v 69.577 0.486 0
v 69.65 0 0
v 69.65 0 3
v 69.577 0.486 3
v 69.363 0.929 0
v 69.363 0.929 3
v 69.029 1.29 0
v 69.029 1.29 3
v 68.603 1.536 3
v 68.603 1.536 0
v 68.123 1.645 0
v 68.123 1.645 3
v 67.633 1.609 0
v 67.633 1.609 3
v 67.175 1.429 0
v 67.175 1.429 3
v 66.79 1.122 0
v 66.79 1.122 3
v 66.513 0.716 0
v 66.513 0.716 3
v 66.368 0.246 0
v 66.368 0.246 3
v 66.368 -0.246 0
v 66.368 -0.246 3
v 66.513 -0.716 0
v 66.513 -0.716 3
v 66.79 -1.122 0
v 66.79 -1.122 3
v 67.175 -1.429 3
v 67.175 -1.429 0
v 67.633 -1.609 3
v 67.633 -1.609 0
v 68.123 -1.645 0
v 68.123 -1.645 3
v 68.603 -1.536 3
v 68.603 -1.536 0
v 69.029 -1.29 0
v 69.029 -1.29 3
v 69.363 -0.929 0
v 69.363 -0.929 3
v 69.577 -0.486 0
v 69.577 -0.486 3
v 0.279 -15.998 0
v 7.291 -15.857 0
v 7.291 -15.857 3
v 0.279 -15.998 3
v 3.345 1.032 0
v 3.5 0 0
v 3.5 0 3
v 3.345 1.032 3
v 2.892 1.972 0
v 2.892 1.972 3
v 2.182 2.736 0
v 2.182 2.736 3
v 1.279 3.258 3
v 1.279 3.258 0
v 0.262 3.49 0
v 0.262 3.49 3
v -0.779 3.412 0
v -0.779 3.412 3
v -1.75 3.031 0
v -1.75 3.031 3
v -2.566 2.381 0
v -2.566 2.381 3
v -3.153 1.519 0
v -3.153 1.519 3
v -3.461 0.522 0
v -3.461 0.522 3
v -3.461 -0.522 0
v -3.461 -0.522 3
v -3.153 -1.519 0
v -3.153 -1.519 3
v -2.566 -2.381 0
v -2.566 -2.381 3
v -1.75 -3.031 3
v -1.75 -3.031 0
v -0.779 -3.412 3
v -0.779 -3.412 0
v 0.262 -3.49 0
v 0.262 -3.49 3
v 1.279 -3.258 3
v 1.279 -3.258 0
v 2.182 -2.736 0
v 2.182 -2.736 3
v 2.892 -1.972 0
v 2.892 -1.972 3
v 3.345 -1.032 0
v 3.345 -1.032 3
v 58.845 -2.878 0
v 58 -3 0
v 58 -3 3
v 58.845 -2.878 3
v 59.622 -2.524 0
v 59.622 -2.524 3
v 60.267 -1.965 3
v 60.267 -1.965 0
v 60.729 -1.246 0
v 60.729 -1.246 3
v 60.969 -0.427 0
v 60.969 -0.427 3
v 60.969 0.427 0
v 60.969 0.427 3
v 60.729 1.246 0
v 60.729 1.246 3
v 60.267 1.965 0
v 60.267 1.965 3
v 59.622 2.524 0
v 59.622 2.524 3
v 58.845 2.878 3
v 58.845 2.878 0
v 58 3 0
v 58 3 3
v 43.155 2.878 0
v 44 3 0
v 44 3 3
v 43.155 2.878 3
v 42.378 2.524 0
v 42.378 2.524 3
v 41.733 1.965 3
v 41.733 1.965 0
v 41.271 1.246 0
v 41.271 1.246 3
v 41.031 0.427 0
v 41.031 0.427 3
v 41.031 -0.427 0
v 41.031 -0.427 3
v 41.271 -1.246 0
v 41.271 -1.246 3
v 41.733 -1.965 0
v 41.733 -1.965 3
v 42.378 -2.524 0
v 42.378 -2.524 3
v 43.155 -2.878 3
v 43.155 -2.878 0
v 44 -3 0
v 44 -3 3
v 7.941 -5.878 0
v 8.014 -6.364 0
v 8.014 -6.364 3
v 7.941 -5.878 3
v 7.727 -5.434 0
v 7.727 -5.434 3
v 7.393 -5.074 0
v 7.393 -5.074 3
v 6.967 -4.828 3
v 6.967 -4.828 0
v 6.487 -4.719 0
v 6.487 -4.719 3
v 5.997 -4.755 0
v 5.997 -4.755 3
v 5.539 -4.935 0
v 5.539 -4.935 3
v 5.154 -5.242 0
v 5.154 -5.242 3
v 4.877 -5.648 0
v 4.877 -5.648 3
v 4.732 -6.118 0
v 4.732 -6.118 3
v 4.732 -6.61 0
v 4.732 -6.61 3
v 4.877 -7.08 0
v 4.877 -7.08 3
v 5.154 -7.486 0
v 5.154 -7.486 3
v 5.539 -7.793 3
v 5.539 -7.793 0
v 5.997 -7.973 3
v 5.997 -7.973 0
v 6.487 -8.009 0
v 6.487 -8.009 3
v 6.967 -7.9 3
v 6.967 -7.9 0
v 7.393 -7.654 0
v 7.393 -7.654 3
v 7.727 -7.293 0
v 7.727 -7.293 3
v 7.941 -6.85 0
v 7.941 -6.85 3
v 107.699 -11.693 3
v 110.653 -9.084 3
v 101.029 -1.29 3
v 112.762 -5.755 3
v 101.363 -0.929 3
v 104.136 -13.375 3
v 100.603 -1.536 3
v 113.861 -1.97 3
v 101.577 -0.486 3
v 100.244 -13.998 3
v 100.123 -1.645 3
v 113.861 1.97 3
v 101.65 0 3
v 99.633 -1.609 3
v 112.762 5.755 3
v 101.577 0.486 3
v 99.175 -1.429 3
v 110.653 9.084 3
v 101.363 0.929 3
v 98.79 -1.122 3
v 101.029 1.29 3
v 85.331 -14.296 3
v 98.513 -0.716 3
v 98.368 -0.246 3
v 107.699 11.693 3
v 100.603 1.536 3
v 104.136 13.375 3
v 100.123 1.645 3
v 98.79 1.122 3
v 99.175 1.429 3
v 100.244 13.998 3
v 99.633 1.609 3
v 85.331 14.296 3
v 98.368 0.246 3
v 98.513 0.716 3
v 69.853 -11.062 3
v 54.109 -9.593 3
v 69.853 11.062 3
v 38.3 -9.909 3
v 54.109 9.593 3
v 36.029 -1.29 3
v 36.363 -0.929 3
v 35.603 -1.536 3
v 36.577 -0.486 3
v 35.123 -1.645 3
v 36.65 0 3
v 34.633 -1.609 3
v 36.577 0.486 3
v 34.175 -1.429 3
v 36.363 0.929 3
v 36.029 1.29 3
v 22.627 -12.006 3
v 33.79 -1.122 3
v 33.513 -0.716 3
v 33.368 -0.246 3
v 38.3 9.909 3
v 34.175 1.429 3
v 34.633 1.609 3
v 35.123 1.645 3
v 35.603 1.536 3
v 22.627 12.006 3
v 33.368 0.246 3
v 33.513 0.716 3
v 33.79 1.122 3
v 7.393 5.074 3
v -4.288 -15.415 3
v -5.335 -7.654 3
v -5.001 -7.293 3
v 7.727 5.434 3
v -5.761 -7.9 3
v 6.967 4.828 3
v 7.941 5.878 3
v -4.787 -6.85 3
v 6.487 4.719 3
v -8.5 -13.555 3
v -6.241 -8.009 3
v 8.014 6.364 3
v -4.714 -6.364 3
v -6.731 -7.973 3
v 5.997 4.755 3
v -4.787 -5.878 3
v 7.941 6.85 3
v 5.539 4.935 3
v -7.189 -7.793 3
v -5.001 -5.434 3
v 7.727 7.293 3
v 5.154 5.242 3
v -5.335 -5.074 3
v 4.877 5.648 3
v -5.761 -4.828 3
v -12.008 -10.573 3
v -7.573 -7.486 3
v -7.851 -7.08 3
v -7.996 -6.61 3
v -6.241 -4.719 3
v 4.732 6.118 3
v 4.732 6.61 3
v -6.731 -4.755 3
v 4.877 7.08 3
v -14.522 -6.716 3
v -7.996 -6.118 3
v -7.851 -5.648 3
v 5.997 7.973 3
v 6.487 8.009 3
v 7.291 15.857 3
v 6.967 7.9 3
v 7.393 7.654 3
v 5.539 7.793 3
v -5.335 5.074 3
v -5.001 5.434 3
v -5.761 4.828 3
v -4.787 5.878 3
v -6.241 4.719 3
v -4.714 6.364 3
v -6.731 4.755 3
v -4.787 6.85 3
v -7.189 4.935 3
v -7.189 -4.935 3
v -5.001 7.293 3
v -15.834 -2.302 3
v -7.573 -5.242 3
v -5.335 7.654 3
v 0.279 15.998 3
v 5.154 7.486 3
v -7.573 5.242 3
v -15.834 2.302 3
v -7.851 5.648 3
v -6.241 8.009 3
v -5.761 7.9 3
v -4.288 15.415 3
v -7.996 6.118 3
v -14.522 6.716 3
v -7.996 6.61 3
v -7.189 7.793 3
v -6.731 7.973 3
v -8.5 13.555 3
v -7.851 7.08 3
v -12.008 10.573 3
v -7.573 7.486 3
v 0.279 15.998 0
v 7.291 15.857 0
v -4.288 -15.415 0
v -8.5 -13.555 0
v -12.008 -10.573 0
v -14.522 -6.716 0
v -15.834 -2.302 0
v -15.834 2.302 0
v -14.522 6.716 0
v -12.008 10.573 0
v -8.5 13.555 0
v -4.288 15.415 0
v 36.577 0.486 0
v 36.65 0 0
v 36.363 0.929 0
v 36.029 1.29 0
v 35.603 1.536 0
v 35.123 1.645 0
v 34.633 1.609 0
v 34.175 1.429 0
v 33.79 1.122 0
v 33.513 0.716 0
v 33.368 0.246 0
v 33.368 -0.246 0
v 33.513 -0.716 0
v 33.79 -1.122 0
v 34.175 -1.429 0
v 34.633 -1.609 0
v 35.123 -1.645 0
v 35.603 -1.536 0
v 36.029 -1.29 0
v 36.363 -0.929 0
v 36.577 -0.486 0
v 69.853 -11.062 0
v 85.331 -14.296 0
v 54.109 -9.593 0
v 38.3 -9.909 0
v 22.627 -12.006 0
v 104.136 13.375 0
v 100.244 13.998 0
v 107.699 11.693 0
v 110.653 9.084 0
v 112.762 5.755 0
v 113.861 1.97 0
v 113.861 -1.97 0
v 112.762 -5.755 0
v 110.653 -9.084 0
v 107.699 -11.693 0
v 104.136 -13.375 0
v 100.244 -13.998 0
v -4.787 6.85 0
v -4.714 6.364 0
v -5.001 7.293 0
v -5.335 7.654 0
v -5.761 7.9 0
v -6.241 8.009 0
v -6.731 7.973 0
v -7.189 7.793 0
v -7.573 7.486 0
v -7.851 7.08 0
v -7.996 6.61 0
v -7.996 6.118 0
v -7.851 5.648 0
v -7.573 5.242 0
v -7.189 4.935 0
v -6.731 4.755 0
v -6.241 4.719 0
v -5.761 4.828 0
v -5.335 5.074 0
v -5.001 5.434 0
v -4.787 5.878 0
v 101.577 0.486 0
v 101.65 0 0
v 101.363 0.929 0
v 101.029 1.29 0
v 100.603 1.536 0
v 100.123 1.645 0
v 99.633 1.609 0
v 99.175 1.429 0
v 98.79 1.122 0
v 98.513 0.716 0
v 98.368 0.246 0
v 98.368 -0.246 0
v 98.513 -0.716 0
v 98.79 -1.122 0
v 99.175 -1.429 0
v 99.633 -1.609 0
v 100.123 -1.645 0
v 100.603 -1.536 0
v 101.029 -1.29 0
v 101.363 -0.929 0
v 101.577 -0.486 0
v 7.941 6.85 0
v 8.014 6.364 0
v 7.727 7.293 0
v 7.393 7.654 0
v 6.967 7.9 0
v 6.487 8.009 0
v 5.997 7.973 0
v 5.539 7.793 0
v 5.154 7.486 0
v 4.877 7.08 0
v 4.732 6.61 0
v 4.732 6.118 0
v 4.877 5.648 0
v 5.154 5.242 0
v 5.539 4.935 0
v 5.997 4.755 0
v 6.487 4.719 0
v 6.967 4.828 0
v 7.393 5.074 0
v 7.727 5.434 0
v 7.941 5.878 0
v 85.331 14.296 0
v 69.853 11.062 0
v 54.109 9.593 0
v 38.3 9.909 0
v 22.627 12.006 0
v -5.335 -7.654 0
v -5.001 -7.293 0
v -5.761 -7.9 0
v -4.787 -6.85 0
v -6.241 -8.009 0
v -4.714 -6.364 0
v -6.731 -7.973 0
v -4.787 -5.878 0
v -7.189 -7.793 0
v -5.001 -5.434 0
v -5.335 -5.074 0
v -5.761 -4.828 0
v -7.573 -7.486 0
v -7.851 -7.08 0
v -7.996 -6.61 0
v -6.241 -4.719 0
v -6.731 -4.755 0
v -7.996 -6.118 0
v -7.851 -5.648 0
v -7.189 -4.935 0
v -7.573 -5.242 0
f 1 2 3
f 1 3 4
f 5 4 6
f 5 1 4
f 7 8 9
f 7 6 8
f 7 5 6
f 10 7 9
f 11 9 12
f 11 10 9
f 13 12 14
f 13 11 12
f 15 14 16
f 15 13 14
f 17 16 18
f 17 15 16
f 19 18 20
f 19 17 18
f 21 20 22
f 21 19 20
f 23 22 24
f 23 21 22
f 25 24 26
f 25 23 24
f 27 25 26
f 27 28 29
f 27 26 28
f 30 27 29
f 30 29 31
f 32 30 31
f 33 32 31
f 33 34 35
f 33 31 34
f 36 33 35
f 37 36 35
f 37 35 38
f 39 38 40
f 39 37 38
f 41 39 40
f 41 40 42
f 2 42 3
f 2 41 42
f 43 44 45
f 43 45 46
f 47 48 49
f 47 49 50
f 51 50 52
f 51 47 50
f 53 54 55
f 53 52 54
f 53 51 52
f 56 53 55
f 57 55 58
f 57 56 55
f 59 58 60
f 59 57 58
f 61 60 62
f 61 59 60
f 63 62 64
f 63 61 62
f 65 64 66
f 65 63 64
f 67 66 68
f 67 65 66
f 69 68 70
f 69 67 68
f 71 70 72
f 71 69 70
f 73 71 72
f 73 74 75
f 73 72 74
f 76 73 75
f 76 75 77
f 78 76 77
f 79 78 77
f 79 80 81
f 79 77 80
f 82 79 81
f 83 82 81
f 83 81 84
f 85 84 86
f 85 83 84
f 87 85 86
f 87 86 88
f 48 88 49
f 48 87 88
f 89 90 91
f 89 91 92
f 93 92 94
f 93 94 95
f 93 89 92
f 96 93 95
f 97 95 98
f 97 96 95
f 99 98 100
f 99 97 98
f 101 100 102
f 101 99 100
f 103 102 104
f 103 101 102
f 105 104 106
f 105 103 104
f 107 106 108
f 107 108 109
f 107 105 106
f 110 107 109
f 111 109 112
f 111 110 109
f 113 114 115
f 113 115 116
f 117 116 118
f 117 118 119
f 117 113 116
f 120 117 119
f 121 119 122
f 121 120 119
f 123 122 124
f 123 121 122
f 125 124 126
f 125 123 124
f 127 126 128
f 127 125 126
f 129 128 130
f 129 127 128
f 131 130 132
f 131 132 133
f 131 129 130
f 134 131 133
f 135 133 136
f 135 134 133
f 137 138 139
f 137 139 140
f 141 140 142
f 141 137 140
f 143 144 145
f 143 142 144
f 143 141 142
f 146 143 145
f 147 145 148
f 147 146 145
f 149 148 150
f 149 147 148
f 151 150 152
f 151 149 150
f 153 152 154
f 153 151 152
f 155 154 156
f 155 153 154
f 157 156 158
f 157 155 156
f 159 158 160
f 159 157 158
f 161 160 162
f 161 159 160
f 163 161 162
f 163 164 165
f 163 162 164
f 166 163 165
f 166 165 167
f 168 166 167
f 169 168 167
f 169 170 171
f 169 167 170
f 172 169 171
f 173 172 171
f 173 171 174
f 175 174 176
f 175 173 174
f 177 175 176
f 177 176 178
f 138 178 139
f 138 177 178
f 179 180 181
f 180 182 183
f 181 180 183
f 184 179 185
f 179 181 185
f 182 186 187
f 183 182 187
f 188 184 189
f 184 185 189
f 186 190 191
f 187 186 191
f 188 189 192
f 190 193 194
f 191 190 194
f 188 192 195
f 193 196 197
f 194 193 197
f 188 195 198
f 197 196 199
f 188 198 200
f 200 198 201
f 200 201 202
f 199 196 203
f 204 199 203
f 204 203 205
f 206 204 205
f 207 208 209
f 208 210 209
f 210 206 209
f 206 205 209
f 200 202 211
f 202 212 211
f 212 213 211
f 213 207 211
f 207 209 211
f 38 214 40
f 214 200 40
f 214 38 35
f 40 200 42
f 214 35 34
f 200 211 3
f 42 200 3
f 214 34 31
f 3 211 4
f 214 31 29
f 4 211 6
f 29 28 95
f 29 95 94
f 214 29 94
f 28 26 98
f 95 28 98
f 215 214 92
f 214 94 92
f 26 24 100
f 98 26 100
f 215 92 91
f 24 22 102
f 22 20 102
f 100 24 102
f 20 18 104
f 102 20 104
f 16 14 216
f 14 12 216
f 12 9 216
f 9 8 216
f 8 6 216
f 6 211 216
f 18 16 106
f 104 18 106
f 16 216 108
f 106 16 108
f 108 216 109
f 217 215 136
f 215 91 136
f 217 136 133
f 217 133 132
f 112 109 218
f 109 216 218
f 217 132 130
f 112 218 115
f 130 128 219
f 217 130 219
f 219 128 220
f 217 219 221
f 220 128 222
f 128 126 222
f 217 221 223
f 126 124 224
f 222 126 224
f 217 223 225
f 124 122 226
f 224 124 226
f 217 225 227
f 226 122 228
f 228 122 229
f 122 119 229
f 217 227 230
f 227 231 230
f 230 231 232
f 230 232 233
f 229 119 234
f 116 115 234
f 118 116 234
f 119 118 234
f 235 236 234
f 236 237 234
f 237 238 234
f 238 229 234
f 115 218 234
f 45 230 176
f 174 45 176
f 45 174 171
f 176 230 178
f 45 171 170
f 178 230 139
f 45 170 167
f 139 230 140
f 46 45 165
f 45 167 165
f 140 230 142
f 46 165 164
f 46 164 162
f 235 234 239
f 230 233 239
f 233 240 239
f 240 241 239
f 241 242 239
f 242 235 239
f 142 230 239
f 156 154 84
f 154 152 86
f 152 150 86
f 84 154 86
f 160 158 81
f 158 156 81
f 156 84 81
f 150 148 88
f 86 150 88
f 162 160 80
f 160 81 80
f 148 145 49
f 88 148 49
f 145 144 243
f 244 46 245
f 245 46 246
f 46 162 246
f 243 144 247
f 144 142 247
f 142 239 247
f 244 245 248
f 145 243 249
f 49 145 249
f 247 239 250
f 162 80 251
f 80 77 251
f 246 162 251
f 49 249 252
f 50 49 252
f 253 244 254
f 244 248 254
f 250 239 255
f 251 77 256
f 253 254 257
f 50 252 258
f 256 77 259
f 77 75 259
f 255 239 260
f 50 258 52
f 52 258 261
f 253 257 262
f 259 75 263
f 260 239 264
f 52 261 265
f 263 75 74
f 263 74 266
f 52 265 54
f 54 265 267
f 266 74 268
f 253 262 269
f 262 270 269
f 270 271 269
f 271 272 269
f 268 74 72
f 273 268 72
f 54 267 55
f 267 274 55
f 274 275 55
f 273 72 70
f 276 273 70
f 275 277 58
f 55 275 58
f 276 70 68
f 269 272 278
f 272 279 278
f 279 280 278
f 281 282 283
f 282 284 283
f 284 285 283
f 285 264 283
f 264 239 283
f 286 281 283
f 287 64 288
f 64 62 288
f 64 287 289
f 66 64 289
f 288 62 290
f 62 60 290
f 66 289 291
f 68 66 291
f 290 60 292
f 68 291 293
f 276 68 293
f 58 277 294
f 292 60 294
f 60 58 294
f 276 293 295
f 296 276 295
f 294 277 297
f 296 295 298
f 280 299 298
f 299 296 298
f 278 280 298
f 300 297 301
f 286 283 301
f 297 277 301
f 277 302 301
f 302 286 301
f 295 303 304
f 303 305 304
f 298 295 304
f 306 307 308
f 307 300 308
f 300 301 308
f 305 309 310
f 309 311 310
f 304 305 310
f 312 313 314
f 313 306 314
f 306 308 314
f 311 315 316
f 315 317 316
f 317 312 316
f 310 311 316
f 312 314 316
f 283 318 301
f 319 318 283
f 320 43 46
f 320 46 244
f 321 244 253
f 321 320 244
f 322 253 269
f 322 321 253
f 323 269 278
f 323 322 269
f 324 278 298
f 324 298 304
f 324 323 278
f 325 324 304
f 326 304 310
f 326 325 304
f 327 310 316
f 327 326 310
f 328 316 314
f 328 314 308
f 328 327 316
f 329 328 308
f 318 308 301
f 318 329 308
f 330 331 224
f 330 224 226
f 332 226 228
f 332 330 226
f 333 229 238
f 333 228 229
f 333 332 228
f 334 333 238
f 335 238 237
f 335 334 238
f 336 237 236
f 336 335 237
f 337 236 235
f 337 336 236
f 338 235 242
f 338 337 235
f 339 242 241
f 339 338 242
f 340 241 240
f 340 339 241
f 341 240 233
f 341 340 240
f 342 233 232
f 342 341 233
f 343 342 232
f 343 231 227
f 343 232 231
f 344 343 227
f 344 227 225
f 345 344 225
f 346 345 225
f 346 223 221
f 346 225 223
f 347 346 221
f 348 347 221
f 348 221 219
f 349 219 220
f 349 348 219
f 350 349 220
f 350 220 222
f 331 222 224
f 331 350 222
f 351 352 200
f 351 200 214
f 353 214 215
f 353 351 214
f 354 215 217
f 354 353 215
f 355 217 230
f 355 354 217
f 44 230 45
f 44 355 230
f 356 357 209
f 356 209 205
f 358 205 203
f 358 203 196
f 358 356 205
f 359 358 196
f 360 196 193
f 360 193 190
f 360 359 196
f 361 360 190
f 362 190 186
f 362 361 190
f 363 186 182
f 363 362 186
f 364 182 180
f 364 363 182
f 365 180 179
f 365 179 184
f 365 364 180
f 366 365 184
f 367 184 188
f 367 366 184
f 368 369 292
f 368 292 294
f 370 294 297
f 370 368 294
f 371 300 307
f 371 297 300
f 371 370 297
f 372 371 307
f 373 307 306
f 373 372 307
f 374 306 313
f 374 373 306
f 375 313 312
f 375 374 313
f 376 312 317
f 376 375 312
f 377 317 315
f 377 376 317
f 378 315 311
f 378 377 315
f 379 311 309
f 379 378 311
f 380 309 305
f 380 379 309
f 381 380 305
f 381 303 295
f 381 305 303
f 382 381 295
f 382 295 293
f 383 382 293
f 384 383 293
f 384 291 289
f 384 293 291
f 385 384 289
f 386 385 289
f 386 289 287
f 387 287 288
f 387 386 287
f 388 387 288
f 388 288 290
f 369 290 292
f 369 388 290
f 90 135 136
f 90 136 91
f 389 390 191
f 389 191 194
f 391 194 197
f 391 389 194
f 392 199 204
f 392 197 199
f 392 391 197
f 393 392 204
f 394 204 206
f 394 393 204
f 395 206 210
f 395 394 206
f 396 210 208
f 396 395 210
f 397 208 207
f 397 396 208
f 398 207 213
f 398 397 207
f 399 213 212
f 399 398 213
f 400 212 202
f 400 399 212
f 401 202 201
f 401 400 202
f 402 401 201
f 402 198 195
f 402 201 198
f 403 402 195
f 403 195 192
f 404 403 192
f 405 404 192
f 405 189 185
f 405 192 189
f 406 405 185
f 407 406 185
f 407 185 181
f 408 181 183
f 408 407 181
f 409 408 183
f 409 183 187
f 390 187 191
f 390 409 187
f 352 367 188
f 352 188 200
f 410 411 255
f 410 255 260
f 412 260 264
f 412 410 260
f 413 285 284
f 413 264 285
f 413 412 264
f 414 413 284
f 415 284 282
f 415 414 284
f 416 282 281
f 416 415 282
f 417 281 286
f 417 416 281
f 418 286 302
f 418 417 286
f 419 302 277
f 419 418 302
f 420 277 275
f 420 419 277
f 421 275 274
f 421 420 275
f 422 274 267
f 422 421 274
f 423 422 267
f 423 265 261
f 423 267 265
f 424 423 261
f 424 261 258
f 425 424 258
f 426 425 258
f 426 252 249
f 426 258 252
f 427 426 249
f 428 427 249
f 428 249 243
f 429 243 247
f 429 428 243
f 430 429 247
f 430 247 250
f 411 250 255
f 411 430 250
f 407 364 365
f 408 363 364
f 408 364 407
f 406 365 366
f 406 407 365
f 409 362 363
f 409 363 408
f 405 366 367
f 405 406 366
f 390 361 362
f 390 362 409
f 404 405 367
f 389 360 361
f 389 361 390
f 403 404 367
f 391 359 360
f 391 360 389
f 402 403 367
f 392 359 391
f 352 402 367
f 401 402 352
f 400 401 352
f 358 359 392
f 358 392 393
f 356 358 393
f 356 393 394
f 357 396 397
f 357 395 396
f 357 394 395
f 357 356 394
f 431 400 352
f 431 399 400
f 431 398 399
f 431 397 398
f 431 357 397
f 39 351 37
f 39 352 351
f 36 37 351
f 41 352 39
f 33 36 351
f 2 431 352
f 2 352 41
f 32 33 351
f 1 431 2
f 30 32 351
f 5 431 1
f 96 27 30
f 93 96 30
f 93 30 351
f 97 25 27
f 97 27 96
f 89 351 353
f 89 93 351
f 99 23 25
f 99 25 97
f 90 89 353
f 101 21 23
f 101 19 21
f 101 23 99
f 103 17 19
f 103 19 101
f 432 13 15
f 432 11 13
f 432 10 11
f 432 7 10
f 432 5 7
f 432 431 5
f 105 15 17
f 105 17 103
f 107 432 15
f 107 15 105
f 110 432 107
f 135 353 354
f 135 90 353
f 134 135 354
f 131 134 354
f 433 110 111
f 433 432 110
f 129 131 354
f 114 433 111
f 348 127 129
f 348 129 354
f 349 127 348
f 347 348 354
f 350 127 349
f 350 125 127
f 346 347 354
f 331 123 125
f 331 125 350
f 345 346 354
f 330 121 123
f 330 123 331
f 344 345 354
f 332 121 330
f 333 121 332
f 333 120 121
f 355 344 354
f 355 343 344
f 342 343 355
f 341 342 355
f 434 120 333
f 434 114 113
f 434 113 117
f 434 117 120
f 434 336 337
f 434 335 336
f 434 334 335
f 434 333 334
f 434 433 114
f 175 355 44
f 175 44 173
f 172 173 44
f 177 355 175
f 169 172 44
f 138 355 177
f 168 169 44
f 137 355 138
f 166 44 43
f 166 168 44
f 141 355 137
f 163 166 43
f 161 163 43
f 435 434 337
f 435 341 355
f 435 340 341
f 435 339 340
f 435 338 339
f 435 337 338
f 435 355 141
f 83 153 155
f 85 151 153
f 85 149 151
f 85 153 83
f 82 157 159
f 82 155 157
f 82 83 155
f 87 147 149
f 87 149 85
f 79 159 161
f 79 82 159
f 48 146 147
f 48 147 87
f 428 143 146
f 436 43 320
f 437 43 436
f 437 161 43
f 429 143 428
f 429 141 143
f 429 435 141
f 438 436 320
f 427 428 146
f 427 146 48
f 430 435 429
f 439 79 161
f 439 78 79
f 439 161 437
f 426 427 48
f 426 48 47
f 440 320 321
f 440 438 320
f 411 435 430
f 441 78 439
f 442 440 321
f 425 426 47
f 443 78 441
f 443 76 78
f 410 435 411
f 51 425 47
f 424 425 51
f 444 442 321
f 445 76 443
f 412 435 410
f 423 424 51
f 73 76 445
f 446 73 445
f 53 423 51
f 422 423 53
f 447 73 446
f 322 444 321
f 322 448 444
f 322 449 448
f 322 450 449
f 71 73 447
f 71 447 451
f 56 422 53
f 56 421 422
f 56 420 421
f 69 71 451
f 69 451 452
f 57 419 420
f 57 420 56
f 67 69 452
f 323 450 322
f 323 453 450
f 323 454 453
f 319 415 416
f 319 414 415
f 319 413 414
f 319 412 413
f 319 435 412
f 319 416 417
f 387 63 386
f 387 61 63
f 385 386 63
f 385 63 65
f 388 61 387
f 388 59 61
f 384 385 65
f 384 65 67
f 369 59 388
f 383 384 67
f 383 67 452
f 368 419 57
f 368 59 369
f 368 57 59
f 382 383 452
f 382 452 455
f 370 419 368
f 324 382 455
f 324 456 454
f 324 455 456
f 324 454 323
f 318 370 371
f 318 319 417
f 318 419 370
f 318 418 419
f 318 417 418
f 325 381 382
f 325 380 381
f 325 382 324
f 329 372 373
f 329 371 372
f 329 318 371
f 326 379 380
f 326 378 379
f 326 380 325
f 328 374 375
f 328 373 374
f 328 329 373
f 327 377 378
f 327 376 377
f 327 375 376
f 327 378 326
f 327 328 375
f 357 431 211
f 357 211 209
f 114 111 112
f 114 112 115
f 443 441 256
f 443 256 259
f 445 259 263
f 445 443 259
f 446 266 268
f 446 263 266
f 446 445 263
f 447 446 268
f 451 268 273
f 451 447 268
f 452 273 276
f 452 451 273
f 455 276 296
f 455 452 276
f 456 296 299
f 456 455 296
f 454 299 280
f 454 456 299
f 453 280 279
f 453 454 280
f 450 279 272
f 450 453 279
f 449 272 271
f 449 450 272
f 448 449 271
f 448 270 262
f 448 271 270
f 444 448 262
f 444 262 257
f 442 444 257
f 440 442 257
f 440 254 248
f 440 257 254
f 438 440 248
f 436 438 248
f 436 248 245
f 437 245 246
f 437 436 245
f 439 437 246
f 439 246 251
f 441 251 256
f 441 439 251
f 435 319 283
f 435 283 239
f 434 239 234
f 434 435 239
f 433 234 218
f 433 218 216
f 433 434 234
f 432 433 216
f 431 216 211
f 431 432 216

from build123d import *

# Parameters (mm, degrees)
PLASTINA_DEPTH        = 3
OTVERSTIYA_DEPTH      = 116.156318141
OTVERSTIYA_DEPTH_BACK = 116.156318141
ESKIZ_OTVERSTIYA_R    = 1.65
ESKIZ_OTVERSTIYA_R_2  = 3.5


with BuildPart() as part:
    # Eskiz_kontur → Plastina (new body)
    with BuildSketch(Plane.XY):
        with BuildLine():
            Line((7.29115, -15.8573), (0.27924, -15.99756))
            ThreePointArc((0.27924, -15.99756), (-15.999996904, 0), (0.27924, 15.99756))
            Line((0.27924, 15.99756), (7.29115, 15.8573))
            ThreePointArc((7.29115, 15.8573), (46.200008227, 9.528004702), (85.330859965, 14.296198255))
            Line((85.330859965, 14.296198255), (100.244329965, 13.997868255))
            ThreePointArc((100.244329965, 13.997868255), (113.999902223, 0), (100.244329965, -13.997868255))
            Line((100.244329965, -13.997868255), (85.330859965, -14.296198255))
            ThreePointArc((85.330859965, -14.296198255), (46.200008227, -9.528004702), (7.29115, -15.8573))
        make_face()
        with BuildLine():
            Line((58, 3), (44, 3))
            ThreePointArc((44, 3), (41, 0), (44, -3))
            Line((44, -3), (58, -3))
            ThreePointArc((58, -3), (61, 0), (58, 3))
        make_face(mode=Mode.SUBTRACT)
    extrude(amount=PLASTINA_DEPTH)

    # Eskiz_otverstiya → Otverstiya (cut, two sides: drawn at the far end of the back side and taken through both)
    with BuildSketch(Plane.XY.offset(-OTVERSTIYA_DEPTH_BACK)):
        with Locations((-6.36396, -6.36396)):
            Circle(ESKIZ_OTVERSTIYA_R)
        with Locations((6.36396, -6.36396)):
            Circle(ESKIZ_OTVERSTIYA_R)
        Circle(ESKIZ_OTVERSTIYA_R_2)
        with Locations((35, 0)):
            Circle(ESKIZ_OTVERSTIYA_R)
        with Locations((-6.36396, 6.36396)):
            Circle(ESKIZ_OTVERSTIYA_R)
        with Locations((6.36396, 6.36396)):
            Circle(ESKIZ_OTVERSTIYA_R)
        with Locations((68, 0)):
            Circle(ESKIZ_OTVERSTIYA_R)
        with Locations((100, 0)):
            Circle(ESKIZ_OTVERSTIYA_R)
    extrude(amount=OTVERSTIYA_DEPTH + OTVERSTIYA_DEPTH_BACK, mode=Mode.SUBTRACT)


solid = part.part
